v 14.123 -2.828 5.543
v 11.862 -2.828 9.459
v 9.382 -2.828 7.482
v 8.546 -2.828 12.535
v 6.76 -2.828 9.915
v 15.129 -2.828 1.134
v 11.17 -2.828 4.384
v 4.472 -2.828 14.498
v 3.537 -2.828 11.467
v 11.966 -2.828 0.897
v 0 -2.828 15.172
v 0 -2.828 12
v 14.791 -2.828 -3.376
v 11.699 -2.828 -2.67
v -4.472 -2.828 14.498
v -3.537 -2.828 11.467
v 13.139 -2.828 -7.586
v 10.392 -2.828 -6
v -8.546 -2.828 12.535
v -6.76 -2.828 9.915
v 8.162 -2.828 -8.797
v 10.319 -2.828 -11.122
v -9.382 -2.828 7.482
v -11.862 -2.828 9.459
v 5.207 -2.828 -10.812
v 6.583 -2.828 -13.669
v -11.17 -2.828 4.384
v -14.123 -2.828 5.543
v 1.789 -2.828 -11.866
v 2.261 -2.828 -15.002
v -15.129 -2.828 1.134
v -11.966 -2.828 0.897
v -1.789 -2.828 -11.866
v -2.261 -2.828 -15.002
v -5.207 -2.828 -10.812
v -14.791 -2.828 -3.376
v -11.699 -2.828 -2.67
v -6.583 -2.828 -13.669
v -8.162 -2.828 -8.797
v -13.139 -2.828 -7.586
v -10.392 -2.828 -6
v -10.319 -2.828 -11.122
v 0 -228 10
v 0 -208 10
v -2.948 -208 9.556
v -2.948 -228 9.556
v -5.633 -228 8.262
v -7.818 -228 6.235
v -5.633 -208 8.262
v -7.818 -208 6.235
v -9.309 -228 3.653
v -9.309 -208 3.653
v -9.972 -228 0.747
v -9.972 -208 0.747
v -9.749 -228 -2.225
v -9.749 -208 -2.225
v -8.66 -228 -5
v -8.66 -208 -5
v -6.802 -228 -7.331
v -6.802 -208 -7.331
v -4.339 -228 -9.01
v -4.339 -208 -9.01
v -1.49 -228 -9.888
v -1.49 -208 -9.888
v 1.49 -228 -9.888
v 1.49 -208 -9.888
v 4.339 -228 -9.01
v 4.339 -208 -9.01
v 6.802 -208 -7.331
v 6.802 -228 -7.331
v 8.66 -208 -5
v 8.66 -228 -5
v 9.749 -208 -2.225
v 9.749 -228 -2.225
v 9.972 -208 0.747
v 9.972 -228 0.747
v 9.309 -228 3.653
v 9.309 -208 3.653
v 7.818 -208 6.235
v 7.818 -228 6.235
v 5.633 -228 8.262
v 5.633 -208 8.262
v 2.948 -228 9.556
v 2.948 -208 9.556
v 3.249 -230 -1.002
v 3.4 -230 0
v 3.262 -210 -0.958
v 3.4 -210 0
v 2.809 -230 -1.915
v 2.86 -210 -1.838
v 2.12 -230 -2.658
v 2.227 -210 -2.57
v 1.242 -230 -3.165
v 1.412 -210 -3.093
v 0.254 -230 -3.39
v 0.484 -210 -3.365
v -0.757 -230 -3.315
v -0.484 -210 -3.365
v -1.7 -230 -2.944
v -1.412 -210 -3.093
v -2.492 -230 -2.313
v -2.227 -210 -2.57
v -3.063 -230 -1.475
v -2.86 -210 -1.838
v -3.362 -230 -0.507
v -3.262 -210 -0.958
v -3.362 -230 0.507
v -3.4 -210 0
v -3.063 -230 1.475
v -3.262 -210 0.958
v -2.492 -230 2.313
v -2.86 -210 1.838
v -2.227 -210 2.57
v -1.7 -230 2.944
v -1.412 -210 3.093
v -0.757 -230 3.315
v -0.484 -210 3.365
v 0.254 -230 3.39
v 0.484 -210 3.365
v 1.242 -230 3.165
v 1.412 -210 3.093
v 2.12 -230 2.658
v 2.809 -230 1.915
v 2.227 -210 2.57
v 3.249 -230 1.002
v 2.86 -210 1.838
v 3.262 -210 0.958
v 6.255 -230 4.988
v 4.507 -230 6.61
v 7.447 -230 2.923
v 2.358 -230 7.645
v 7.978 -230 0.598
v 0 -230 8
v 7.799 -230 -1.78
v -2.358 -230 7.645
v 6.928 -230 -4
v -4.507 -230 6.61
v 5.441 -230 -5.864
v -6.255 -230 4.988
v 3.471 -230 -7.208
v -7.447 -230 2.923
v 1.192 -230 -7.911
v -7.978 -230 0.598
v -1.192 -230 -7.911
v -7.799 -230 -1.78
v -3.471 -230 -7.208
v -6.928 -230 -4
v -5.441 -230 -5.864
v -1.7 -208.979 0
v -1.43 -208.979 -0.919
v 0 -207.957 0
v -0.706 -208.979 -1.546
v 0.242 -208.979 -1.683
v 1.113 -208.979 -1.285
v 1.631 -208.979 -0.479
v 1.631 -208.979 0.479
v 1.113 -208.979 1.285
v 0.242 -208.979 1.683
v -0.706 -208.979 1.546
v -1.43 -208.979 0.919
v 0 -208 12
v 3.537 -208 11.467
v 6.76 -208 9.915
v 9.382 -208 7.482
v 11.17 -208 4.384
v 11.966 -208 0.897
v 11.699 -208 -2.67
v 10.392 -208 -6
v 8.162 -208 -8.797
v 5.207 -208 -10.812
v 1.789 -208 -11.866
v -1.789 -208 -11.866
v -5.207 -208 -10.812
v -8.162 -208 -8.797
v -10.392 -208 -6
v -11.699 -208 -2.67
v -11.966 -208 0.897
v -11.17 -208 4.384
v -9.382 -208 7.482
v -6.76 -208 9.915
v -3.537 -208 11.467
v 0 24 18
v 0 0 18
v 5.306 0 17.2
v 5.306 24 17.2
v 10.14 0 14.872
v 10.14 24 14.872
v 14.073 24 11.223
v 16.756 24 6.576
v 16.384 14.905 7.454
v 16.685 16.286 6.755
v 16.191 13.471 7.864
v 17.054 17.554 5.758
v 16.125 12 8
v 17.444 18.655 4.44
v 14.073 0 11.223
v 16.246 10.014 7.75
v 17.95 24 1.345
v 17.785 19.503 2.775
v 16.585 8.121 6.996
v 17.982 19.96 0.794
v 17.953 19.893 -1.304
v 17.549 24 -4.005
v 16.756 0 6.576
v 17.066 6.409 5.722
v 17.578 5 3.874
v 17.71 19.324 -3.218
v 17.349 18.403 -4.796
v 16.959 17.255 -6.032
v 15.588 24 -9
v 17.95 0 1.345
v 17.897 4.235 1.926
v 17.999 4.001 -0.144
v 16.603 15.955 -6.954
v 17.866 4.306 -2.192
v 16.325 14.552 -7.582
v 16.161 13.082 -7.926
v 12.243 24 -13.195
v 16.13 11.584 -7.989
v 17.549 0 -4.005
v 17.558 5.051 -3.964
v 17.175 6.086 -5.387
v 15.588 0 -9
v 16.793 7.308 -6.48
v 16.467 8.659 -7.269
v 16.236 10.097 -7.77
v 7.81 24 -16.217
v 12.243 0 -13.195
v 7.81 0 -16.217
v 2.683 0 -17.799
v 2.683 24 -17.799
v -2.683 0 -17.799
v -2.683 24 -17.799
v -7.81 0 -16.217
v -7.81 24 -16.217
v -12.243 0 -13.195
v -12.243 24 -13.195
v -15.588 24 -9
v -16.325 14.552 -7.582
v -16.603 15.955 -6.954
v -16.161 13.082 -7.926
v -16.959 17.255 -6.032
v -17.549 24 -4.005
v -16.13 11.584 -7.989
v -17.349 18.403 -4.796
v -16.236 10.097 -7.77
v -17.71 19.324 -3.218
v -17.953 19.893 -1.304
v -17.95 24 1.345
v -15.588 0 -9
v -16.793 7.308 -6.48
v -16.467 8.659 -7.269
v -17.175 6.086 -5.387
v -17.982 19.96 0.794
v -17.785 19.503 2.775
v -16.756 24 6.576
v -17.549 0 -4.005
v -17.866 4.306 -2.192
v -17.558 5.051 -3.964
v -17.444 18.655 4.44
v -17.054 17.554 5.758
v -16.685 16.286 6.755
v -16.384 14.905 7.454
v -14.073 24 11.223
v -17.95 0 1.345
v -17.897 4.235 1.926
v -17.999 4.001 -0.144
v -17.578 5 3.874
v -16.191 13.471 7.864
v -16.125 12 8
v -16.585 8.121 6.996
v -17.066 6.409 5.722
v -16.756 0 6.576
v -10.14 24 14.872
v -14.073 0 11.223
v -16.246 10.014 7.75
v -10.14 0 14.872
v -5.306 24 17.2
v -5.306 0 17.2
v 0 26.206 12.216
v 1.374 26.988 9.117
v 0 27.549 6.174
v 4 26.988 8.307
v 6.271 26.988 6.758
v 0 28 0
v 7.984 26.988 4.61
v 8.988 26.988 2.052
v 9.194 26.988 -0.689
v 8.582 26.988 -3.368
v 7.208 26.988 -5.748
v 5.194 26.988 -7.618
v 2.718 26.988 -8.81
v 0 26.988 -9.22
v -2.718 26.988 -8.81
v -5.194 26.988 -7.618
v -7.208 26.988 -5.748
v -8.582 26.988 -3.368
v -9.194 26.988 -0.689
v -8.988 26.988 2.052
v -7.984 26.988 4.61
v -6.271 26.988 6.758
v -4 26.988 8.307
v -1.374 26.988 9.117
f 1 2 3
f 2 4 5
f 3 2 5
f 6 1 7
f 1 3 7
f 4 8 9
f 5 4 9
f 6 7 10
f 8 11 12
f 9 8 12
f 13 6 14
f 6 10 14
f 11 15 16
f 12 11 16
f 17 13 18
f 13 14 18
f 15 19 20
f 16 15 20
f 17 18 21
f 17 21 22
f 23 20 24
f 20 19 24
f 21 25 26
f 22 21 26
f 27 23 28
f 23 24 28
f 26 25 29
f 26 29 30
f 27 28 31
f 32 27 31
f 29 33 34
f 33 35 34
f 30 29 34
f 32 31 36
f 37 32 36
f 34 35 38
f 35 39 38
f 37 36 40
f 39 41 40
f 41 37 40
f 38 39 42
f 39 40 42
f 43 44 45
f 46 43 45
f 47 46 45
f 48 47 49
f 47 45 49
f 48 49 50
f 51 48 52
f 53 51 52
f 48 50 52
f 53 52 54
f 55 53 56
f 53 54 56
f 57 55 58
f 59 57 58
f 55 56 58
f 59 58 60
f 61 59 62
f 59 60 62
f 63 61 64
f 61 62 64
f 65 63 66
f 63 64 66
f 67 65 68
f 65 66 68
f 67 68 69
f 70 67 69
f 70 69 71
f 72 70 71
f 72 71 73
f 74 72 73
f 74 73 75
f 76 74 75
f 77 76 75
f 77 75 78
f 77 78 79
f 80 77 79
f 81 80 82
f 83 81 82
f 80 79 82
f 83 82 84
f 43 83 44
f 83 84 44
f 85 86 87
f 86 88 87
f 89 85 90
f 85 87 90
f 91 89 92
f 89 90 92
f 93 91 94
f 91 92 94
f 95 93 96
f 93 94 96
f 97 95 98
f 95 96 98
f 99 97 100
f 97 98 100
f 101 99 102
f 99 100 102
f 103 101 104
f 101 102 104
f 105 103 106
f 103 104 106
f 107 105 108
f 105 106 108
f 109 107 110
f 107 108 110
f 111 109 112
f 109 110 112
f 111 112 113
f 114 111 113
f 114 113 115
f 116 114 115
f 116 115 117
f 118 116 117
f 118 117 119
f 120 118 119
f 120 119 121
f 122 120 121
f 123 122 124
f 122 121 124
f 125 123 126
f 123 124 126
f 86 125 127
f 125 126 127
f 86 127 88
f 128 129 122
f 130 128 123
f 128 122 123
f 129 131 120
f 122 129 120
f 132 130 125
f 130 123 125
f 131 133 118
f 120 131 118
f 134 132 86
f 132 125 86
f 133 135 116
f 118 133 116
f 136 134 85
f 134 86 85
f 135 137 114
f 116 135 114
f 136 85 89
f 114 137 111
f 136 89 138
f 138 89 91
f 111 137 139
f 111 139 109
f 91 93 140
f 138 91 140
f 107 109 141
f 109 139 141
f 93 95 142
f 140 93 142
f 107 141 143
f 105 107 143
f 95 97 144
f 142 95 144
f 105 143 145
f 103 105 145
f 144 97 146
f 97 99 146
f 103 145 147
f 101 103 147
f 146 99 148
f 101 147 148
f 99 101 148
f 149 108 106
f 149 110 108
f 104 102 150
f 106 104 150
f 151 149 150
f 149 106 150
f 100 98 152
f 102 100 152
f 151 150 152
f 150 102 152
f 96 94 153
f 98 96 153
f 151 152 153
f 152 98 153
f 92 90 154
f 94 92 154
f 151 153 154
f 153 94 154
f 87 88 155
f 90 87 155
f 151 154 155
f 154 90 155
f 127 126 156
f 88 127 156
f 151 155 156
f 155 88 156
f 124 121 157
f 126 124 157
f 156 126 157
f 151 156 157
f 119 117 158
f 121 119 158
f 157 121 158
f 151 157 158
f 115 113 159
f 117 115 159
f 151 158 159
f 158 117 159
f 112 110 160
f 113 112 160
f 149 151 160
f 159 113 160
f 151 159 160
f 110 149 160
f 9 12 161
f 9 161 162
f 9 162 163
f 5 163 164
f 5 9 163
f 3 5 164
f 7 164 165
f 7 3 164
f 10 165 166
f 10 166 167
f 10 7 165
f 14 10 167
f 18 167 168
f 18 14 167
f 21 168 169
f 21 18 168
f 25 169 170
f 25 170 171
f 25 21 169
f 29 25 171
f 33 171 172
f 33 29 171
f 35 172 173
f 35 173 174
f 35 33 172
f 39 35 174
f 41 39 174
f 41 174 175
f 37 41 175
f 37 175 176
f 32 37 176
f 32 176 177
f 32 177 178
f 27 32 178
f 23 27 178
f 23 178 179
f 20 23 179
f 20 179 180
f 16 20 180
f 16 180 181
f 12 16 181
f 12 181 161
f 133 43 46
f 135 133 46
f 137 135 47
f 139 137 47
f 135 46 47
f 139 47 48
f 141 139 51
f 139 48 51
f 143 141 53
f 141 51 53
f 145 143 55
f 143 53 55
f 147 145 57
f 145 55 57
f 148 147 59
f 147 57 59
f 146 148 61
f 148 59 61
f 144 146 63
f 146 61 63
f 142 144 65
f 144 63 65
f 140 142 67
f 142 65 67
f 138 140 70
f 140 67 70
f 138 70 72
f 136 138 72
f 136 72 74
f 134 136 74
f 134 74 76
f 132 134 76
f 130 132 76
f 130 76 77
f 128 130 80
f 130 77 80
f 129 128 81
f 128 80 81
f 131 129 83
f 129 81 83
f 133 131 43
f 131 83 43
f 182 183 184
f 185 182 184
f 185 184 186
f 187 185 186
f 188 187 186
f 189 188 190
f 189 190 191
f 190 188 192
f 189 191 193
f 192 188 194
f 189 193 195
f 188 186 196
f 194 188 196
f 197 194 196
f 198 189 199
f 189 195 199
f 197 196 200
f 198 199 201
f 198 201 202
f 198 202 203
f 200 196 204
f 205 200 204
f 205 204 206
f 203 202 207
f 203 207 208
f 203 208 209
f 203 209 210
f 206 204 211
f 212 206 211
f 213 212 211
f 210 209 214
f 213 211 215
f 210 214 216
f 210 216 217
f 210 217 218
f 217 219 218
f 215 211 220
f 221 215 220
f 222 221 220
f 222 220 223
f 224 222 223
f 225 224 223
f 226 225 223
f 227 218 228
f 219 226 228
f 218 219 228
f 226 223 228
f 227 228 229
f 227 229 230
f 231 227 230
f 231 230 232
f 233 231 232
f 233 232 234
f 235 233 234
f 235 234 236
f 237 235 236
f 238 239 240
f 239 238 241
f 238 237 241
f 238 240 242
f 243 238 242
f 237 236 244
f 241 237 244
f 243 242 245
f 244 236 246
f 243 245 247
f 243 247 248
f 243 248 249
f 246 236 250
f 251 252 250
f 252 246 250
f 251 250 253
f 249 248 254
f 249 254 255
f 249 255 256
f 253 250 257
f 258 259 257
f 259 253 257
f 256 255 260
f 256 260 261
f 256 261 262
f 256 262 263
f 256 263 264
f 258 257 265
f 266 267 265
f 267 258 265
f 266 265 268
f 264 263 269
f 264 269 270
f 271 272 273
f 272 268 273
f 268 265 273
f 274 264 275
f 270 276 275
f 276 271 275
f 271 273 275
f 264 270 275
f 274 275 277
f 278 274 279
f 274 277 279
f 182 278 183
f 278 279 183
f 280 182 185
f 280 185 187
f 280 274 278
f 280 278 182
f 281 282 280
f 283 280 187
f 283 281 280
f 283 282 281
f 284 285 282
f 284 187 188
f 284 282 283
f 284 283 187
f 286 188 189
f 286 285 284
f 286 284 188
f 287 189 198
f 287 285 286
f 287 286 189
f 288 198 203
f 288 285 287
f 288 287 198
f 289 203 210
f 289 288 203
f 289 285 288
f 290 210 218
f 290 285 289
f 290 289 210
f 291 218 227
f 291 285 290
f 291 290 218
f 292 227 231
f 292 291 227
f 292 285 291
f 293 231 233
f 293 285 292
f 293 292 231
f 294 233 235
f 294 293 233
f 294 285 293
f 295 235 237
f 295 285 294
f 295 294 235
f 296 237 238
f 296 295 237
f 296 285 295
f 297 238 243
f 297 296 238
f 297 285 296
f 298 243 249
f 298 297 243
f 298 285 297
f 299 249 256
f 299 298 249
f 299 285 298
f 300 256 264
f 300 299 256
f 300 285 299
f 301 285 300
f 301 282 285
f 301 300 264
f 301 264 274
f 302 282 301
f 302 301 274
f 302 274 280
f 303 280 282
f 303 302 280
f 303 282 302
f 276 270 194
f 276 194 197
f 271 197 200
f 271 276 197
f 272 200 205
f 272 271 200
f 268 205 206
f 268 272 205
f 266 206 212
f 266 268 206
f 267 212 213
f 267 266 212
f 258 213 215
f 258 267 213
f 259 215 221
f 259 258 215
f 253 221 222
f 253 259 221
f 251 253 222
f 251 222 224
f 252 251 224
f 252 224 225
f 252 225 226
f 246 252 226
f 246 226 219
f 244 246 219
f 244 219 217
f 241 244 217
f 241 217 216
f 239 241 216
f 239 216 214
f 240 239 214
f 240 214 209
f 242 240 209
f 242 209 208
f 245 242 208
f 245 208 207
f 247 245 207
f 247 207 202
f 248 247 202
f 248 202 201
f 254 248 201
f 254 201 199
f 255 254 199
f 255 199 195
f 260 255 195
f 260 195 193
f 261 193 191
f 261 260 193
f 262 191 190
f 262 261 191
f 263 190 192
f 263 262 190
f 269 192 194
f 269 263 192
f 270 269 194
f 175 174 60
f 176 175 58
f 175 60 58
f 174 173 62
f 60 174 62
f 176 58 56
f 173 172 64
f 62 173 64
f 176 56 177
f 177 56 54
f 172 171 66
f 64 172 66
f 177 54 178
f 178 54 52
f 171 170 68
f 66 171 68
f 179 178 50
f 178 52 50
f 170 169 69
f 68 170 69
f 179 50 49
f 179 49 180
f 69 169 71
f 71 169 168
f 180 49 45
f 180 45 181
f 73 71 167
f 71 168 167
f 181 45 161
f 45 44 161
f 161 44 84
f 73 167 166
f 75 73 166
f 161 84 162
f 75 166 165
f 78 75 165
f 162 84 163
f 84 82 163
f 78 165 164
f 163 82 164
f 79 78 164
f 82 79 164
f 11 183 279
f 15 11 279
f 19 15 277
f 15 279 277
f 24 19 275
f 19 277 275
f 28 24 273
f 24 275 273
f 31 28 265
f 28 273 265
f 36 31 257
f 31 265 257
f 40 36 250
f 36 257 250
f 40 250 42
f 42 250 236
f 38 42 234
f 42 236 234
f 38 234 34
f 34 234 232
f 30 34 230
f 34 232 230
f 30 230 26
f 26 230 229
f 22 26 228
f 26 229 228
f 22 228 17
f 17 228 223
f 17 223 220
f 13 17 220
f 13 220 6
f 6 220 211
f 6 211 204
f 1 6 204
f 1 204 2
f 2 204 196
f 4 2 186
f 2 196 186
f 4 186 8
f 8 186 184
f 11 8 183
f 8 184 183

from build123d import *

# Parameters (mm, degrees)
SKETCH1_R               = 18
BOSS_EXTRUDE1_DEPTH     = 24
CUT_EXTRUDE1_DEPTH      = 24
CUT_EXTRUDE1_DEPTH_BACK = 24
SKETCH2_R               = 8
DOME1_FACE_RADIUS       = 18
DOME1_HEIGHT            = 4
SKETCH5_R               = 12
BOSS_EXTRUDE3_DEPTH     = 208
SKETCH13_R              = 10
BOSS_EXTRUDE4_DEPTH     = 20
M8_TAPPED_HOLE1_D       = 6.8
M8_TAPPED_HOLE1_DEPTH   = 20
M8_TAPPED_HOLE1_TIP     = 2.042926105


with BuildPart() as part:
    # Sketch1 → Boss-Extrude1 (new body)
    with BuildSketch(Plane(origin=(0, 0, 0), x_dir=(1, 0, 0), z_dir=(0, 1, 0))):
        with Locations(Location((0, 0, 0), (0, 0, 270))):
            Circle(SKETCH1_R)
    extrude(amount=BOSS_EXTRUDE1_DEPTH)

    # Sketch2 → Cut-Extrude1 (cut, two sides: drawn at the far end of the back side and taken through both)
    with BuildSketch(Plane(origin=(0, 0, 0), x_dir=(0, 0, -1), z_dir=(1, 0, 0)).offset(-CUT_EXTRUDE1_DEPTH_BACK)):
        with Locations(Location((0, 12, 0), (0, 0, 180))):
            Circle(SKETCH2_R)
    extrude(amount=CUT_EXTRUDE1_DEPTH + CUT_EXTRUDE1_DEPTH_BACK, mode=Mode.SUBTRACT)

    # Dome1: a dome of height H over a round flat face of radius A is a cap of a sphere of radius (A * A + H * H) / (2 * H)
    dome1_r = (DOME1_FACE_RADIUS * DOME1_FACE_RADIUS + DOME1_HEIGHT * DOME1_HEIGHT) / (2 * DOME1_HEIGHT)
    dome1_base = Plane((0, 24, 0), z_dir=(0, 1, 0))
    with Locations(dome1_base.offset(DOME1_HEIGHT - dome1_r)):
        dome1_ball = Sphere(dome1_r, mode=Mode.PRIVATE)
    add(split(dome1_ball, bisect_by=dome1_base, keep=Keep.TOP, mode=Mode.PRIVATE))

    # Sketch3 → Revolve1 (revolve)
    with BuildSketch(Plane(origin=(0, 0, 0), x_dir=(0, 0, -1), z_dir=(1, 0, 0)), mode=Mode.PRIVATE) as revolve1_sk:
        Polygon((0, 0), (0, -2.828427125), (15.171572875, -2.828427125), (18, 0), align=None)
    revolve(revolve1_sk.sketch.rotate(Axis((0, 0, 0), (0, -1, 0)), 180), axis=Axis((0, 0, 0), (0, -1, 0)))

    # Sketch5 → Boss-Extrude3 (add)
    with BuildSketch(Plane(origin=(0, 0, 0), x_dir=(1, 0, 0), z_dir=(0, 1, 0))):
        with Locations(Location((0, 0, 0), (0, 0, 270))):
            Circle(SKETCH5_R)
    extrude(amount=-BOSS_EXTRUDE3_DEPTH)

    # Sketch13 → Boss-Extrude4 (add)
    with BuildSketch(Plane(origin=(0, -208, 0), x_dir=(-1, 0, 0), z_dir=(0, -1, 0))):
        with Locations(Location((0, 0, 0), (0, 0, 270))):
            Circle(SKETCH13_R)
    extrude(amount=BOSS_EXTRUDE4_DEPTH)

    # Sketch14 → Revolve2 (revolve)
    with BuildSketch(Plane(origin=(0, 0, 0), x_dir=(0, 0, -1), z_dir=(1, 0, 0))):
        Polygon((0, -228), (0, -230), (-8, -230), (-10, -228), align=None)
    revolve(axis=Axis((0, -228, 0), (0, -1, 0)))

    # M8 Tapped Hole1
    with Locations(Plane(origin=(0, -230, 0), x_dir=(-1, 0, 0), z_dir=(0, -1, 0))):
        with Locations((0, 0)):
            Hole(M8_TAPPED_HOLE1_D / 2, depth=M8_TAPPED_HOLE1_DEPTH)
            with Locations((0, 0, -(M8_TAPPED_HOLE1_DEPTH + M8_TAPPED_HOLE1_TIP / 2))):  # 118° drill point
                Cone(0, M8_TAPPED_HOLE1_D / 2, M8_TAPPED_HOLE1_TIP, mode=Mode.SUBTRACT)


solid = part.part
